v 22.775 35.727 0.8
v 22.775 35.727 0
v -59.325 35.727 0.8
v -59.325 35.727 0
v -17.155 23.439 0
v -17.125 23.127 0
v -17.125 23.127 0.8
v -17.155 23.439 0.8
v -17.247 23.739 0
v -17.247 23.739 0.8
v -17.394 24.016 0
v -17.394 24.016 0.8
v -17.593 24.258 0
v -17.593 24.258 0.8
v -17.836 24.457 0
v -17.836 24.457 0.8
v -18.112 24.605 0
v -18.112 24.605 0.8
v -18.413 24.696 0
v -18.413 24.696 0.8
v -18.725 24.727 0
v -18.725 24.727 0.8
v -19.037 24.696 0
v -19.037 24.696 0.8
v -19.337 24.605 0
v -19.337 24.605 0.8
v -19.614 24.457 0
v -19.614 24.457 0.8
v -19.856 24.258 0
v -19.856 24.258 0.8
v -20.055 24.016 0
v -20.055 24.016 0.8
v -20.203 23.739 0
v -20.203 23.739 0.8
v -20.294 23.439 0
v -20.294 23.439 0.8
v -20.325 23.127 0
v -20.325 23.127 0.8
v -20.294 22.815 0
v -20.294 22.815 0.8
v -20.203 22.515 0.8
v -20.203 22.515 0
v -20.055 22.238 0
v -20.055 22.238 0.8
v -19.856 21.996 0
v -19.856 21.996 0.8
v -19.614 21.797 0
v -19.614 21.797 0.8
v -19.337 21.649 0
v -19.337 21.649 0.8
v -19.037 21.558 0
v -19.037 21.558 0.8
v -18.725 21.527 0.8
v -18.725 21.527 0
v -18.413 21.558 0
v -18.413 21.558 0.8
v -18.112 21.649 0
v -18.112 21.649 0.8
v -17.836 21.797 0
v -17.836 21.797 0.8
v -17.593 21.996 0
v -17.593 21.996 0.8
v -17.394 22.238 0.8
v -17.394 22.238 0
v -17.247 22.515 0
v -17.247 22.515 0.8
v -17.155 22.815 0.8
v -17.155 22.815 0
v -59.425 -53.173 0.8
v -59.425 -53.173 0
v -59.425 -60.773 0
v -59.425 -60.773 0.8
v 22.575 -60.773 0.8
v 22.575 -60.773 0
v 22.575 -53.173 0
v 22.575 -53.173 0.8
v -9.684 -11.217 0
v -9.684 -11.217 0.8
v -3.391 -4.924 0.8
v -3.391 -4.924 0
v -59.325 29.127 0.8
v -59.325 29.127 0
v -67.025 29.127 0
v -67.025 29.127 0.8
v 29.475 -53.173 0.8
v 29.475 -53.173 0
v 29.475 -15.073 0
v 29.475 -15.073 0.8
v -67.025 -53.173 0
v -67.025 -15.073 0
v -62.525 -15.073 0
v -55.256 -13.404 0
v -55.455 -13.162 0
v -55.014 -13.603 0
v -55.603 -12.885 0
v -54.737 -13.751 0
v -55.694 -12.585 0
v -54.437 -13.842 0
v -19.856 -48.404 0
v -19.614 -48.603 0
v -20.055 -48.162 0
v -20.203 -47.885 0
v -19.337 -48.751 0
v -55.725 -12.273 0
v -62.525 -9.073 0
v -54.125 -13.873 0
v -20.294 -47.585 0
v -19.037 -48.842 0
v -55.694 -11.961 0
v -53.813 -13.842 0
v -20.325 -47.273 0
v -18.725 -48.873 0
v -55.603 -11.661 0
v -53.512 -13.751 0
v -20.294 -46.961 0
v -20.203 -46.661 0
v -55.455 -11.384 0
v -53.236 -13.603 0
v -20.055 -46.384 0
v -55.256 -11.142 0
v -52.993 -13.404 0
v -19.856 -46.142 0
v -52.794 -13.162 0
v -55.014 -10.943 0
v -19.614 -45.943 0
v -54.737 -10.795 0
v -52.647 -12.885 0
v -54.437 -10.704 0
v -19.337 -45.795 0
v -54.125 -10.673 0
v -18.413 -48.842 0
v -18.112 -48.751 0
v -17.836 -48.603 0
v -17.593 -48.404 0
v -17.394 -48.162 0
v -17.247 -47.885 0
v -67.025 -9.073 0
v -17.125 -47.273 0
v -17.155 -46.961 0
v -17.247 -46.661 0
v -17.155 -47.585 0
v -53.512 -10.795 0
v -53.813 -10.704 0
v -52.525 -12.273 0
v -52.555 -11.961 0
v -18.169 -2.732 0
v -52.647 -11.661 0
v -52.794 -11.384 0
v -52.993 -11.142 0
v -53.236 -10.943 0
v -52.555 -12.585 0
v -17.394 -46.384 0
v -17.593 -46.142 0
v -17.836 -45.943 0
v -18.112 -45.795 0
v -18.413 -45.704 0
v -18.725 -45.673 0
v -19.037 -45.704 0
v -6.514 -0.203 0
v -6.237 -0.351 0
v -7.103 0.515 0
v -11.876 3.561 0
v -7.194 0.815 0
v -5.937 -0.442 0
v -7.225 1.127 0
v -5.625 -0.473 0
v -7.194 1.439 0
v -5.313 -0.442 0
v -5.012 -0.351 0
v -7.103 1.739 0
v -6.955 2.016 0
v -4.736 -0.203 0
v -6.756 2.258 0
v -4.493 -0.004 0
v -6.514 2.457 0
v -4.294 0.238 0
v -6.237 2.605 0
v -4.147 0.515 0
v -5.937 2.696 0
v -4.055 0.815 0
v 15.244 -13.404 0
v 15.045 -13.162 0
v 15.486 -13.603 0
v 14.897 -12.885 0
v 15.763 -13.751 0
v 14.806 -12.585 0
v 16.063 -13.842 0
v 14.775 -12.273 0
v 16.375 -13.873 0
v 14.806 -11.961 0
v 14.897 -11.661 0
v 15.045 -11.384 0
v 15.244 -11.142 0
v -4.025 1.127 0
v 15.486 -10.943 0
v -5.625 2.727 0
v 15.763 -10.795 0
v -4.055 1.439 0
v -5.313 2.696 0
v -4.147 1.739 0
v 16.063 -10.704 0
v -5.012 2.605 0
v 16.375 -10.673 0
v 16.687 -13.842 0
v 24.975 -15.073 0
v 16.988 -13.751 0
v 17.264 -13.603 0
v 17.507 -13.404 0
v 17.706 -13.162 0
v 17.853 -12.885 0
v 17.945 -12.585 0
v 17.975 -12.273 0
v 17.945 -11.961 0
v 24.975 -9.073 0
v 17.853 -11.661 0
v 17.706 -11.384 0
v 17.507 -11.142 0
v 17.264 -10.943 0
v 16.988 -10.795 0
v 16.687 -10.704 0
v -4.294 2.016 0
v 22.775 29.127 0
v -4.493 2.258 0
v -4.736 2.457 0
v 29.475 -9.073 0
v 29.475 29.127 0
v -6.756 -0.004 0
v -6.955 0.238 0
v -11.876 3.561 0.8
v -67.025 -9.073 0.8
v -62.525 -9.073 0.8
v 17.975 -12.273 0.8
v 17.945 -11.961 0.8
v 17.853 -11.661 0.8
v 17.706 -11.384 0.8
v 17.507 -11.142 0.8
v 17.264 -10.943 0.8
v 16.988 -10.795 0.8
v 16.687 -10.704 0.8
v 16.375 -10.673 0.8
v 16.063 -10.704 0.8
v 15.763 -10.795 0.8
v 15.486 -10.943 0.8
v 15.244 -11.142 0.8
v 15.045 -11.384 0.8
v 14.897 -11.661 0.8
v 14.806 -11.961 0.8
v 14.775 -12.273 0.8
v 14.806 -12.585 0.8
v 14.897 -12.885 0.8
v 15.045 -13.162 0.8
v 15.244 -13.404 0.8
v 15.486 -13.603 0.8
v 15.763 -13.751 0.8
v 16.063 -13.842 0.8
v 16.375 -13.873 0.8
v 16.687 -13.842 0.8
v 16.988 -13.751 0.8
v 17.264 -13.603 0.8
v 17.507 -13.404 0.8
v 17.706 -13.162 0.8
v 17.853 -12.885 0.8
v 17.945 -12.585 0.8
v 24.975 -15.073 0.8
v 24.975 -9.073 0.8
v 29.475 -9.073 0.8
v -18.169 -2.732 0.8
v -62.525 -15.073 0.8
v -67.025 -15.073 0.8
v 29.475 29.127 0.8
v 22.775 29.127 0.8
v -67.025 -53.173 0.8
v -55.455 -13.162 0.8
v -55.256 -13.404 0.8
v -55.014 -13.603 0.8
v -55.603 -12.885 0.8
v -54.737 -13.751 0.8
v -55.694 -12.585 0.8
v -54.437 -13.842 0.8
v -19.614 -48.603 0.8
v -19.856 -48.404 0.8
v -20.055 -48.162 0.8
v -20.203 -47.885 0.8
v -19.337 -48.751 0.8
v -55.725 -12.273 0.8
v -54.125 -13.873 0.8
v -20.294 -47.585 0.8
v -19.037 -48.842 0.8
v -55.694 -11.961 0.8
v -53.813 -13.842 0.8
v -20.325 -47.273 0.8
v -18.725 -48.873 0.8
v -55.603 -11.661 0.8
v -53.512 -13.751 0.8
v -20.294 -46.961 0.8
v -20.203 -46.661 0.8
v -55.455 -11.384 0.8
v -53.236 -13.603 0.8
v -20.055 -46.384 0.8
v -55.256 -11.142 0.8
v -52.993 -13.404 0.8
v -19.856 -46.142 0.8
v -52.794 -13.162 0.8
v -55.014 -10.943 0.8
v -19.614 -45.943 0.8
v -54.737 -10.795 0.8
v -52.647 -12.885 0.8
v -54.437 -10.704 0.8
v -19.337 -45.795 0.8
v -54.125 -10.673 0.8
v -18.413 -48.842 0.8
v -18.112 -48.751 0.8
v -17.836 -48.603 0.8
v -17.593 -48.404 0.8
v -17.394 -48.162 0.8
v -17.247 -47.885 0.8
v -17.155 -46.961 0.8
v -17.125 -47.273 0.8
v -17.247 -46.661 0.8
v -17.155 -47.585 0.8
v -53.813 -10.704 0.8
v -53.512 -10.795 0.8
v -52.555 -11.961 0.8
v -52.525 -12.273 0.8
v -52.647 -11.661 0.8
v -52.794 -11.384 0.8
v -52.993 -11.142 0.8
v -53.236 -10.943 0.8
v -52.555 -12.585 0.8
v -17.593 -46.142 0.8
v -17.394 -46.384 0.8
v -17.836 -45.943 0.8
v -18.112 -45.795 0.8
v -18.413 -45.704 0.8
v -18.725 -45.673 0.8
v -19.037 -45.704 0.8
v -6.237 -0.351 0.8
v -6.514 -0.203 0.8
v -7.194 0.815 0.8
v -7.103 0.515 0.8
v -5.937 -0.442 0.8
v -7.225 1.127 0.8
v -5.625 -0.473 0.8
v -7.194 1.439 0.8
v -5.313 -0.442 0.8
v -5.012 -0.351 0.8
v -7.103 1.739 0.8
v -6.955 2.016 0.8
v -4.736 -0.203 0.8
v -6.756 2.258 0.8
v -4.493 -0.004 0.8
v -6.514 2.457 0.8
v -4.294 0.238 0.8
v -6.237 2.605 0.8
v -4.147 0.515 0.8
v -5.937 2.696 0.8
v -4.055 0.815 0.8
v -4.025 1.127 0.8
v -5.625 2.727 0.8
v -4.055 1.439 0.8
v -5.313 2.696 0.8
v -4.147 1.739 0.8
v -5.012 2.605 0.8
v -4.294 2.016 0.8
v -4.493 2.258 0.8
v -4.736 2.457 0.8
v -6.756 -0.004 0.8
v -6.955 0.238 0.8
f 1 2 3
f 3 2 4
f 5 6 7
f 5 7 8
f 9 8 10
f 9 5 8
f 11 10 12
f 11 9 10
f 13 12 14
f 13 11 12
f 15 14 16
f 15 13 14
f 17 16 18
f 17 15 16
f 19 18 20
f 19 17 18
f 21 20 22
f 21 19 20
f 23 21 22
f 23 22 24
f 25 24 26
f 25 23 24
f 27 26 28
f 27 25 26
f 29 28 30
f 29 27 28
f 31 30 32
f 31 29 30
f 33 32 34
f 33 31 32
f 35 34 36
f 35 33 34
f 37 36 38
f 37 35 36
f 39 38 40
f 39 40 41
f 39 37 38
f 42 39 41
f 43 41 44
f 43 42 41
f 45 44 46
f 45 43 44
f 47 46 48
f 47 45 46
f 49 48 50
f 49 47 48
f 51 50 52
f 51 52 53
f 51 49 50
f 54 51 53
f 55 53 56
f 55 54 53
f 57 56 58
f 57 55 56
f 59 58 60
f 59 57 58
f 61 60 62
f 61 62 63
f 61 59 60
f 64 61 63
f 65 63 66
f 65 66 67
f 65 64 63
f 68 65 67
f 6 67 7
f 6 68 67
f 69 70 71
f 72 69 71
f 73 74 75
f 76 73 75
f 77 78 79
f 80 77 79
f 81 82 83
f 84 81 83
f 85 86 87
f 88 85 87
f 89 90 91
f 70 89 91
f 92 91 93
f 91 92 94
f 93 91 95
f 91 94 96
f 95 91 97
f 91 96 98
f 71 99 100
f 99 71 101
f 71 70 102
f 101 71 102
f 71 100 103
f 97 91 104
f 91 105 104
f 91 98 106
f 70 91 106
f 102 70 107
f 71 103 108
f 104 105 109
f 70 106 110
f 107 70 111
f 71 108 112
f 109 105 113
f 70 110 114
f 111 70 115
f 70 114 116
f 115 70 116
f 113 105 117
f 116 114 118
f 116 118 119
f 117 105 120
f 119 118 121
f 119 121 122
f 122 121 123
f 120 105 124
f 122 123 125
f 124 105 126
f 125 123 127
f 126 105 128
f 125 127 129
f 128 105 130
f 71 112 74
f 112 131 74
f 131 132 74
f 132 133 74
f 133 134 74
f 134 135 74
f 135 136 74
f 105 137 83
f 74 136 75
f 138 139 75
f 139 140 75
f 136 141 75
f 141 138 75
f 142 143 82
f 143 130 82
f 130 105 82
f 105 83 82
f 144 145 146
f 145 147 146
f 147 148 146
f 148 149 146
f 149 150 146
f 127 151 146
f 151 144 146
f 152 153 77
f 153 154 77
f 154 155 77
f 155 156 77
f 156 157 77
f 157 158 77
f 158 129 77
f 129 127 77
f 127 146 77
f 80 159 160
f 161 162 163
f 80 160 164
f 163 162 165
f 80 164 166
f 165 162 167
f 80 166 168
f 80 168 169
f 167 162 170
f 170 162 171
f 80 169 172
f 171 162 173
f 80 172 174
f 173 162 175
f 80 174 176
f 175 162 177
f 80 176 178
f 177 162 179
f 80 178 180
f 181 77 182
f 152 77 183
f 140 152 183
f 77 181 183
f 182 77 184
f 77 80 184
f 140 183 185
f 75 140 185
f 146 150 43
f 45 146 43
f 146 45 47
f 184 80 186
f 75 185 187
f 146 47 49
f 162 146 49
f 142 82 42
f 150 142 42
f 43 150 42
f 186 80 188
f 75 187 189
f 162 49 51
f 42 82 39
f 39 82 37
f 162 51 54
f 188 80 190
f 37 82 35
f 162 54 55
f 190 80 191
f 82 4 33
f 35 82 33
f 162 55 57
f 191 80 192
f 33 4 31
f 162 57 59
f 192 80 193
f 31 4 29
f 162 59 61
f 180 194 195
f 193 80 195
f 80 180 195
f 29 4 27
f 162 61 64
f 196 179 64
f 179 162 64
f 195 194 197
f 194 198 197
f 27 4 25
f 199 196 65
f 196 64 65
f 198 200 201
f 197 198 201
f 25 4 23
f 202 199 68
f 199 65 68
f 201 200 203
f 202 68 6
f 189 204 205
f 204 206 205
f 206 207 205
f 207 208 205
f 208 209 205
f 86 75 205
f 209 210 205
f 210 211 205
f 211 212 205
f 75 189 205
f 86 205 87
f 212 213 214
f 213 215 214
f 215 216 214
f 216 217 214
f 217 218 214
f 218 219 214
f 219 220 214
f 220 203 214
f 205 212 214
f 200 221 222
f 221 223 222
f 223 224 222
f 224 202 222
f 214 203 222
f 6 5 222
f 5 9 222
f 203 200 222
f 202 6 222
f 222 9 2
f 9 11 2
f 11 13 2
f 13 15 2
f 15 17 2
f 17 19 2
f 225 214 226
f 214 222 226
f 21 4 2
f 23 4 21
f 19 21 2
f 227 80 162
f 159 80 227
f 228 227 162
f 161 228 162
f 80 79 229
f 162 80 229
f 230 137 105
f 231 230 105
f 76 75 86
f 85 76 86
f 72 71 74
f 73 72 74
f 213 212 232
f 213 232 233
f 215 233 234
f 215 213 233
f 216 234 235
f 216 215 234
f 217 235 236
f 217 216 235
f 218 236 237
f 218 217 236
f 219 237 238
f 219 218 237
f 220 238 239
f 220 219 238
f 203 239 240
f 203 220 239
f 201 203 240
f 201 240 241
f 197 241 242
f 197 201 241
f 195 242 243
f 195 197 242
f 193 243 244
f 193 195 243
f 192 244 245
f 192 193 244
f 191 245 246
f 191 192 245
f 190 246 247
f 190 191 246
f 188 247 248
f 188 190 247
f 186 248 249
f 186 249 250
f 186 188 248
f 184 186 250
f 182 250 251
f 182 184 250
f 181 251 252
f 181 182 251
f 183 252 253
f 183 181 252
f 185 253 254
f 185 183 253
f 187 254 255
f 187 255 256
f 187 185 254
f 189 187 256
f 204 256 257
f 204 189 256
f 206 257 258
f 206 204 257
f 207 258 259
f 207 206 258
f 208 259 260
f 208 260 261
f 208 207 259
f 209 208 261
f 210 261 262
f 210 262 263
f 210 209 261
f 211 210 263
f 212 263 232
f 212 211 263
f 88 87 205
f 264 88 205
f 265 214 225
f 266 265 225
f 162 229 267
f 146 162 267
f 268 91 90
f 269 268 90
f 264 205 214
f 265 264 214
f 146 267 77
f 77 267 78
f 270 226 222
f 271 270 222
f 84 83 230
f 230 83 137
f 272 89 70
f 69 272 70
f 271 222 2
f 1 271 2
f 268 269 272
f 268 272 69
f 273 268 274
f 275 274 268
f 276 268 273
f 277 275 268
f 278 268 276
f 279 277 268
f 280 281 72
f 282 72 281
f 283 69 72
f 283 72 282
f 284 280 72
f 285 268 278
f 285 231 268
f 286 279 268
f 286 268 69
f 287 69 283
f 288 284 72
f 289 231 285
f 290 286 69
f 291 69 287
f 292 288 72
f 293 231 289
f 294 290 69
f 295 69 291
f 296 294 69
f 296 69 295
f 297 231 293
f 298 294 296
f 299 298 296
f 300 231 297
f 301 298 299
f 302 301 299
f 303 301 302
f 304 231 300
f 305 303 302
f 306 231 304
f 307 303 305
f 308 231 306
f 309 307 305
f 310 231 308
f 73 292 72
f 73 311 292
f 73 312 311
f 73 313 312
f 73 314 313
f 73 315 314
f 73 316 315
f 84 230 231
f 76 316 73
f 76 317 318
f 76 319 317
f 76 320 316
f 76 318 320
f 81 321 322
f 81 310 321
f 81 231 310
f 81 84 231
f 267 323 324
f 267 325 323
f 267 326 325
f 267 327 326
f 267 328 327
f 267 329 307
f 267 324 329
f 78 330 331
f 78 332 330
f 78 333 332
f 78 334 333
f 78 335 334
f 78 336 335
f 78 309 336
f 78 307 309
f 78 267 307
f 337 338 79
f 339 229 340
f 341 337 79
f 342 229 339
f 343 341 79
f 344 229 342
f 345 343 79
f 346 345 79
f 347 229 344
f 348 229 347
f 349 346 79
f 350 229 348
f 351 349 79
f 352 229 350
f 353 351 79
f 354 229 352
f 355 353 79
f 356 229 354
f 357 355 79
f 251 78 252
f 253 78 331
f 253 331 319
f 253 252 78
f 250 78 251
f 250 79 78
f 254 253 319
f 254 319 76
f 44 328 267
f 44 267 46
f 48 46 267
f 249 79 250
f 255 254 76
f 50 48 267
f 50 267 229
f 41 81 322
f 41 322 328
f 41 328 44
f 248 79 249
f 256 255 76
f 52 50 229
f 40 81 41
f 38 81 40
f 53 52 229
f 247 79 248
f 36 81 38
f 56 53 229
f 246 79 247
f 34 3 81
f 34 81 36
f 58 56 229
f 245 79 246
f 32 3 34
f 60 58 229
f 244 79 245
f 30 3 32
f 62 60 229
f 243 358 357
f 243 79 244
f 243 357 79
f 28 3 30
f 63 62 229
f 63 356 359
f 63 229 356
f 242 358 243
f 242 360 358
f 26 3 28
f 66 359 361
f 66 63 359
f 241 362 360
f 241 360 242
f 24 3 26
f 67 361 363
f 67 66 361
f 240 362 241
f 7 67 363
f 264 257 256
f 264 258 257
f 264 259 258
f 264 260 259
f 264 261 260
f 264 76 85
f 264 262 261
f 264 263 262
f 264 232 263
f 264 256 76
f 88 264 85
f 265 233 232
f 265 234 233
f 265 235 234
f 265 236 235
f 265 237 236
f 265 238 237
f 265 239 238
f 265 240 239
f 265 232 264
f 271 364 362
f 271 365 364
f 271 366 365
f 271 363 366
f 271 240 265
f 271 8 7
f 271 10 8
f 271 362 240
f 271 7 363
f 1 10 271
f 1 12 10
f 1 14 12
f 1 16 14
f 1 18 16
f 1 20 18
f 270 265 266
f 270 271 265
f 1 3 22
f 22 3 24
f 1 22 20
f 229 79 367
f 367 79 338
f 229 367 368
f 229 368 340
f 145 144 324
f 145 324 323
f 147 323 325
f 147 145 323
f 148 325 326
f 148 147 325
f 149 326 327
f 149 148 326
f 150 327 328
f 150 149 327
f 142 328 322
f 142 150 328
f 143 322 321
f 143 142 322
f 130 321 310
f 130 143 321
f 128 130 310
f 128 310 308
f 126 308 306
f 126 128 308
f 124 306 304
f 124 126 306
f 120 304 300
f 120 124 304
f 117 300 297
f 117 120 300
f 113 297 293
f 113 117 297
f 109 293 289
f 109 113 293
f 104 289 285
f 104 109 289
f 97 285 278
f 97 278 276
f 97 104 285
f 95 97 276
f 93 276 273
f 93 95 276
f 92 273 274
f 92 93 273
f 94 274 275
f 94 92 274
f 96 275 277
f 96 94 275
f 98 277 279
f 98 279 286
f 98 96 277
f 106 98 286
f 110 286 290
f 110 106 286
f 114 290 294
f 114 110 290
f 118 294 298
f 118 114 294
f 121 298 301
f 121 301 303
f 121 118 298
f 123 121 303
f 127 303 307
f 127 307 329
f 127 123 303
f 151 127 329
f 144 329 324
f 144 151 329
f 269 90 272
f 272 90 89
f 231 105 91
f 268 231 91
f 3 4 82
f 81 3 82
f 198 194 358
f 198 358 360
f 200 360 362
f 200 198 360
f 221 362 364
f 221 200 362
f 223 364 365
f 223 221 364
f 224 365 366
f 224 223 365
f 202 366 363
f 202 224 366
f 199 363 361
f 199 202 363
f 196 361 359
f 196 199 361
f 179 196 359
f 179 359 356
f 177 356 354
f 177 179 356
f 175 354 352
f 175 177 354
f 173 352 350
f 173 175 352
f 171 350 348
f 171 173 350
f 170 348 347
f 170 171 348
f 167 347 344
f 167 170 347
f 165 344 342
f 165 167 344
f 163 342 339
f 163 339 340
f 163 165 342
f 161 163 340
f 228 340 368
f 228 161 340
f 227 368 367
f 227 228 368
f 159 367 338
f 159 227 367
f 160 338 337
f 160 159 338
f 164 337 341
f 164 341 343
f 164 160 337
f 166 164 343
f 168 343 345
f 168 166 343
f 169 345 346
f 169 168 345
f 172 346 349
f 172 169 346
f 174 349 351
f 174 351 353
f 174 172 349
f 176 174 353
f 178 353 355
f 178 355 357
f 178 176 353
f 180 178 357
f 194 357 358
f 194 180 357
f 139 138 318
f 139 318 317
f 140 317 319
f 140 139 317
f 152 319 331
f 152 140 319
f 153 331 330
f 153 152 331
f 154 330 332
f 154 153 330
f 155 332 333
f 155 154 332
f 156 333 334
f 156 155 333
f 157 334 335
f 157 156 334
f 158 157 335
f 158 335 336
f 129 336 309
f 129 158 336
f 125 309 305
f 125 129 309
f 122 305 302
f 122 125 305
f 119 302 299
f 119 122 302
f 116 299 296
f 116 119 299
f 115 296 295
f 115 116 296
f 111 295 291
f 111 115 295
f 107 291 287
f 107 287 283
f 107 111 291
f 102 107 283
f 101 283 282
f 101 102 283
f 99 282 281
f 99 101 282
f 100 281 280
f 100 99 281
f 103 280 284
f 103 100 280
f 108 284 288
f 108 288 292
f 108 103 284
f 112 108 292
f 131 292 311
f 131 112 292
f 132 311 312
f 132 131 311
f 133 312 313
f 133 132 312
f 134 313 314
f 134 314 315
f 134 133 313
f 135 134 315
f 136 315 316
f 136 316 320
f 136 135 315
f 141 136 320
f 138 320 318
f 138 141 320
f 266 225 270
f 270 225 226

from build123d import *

# Parameters (mm, degrees)
SKETCH1_R           = 1.6
BOSS_EXTRUDE1_DEPTH = 0.8
CUT_EXTRUDE1_DEPTH  = 0.8


with BuildPart() as part:
    # Sketch1 → Boss-Extrude1 (new body)
    with BuildSketch(Plane.XY):
        Polygon((22.775267328, 35.726963173), (-59.324732672, 35.726963173), (-59.324732672, 29.126963173), (-67.024732672, 29.126963173), (-67.024732672, -9.073036827), (-62.524732672, -9.073036827), (-62.524732672, -15.073036827), (-67.024732672, -15.073036827), (-67.024732672, -53.173036827), (-59.424732672, -53.173036827), (-59.424732672, -60.773036827), (22.575267328, -60.773036827), (22.575267328, -53.173036827), (29.475267328, -53.173036827), (29.475267328, -15.073036827), (24.975267328, -15.073036827), (24.975267328, -9.073036827), (29.475267328, -9.073036827), (29.475267328, 29.126963173), (22.775267328, 29.126963173), align=None)
        with Locations((-18.724732672, -47.273036827)):
            Circle(SKETCH1_R, mode=Mode.SUBTRACT)
        with Locations((-54.124732672, -12.273036827)):
            Circle(SKETCH1_R, mode=Mode.SUBTRACT)
        with Locations((-5.624732672, 1.126963173)):
            Circle(SKETCH1_R, mode=Mode.SUBTRACT)
        with Locations((16.375267328, -12.273036827)):
            Circle(SKETCH1_R, mode=Mode.SUBTRACT)
        with Locations((-18.724732672, 23.126963173)):
            Circle(SKETCH1_R, mode=Mode.SUBTRACT)
    extrude(amount=BOSS_EXTRUDE1_DEPTH)

    # Sketch2 → Cut-Extrude1 (cut)
    with BuildSketch(Plane.XY.offset(0.8)):
        Polygon((-7.931660886, -9.465246416), (-16.416942261, -0.979965042), (-18.169105872, -2.732128653), (-9.683824497, -11.217410027), align=None)
        Polygon((-5.032523083, -6.566108613), (-13.517804458, 1.919172761), (-16.416942261, -0.979965042), (-7.931660886, -9.465246416), align=None)
        Polygon((-3.390574145, -4.924159675), (-11.875855519, 3.5611217), (-13.517804458, 1.919172761), (-5.032523083, -6.566108613), align=None)
    extrude(amount=-CUT_EXTRUDE1_DEPTH, mode=Mode.SUBTRACT)


solid = part.part
